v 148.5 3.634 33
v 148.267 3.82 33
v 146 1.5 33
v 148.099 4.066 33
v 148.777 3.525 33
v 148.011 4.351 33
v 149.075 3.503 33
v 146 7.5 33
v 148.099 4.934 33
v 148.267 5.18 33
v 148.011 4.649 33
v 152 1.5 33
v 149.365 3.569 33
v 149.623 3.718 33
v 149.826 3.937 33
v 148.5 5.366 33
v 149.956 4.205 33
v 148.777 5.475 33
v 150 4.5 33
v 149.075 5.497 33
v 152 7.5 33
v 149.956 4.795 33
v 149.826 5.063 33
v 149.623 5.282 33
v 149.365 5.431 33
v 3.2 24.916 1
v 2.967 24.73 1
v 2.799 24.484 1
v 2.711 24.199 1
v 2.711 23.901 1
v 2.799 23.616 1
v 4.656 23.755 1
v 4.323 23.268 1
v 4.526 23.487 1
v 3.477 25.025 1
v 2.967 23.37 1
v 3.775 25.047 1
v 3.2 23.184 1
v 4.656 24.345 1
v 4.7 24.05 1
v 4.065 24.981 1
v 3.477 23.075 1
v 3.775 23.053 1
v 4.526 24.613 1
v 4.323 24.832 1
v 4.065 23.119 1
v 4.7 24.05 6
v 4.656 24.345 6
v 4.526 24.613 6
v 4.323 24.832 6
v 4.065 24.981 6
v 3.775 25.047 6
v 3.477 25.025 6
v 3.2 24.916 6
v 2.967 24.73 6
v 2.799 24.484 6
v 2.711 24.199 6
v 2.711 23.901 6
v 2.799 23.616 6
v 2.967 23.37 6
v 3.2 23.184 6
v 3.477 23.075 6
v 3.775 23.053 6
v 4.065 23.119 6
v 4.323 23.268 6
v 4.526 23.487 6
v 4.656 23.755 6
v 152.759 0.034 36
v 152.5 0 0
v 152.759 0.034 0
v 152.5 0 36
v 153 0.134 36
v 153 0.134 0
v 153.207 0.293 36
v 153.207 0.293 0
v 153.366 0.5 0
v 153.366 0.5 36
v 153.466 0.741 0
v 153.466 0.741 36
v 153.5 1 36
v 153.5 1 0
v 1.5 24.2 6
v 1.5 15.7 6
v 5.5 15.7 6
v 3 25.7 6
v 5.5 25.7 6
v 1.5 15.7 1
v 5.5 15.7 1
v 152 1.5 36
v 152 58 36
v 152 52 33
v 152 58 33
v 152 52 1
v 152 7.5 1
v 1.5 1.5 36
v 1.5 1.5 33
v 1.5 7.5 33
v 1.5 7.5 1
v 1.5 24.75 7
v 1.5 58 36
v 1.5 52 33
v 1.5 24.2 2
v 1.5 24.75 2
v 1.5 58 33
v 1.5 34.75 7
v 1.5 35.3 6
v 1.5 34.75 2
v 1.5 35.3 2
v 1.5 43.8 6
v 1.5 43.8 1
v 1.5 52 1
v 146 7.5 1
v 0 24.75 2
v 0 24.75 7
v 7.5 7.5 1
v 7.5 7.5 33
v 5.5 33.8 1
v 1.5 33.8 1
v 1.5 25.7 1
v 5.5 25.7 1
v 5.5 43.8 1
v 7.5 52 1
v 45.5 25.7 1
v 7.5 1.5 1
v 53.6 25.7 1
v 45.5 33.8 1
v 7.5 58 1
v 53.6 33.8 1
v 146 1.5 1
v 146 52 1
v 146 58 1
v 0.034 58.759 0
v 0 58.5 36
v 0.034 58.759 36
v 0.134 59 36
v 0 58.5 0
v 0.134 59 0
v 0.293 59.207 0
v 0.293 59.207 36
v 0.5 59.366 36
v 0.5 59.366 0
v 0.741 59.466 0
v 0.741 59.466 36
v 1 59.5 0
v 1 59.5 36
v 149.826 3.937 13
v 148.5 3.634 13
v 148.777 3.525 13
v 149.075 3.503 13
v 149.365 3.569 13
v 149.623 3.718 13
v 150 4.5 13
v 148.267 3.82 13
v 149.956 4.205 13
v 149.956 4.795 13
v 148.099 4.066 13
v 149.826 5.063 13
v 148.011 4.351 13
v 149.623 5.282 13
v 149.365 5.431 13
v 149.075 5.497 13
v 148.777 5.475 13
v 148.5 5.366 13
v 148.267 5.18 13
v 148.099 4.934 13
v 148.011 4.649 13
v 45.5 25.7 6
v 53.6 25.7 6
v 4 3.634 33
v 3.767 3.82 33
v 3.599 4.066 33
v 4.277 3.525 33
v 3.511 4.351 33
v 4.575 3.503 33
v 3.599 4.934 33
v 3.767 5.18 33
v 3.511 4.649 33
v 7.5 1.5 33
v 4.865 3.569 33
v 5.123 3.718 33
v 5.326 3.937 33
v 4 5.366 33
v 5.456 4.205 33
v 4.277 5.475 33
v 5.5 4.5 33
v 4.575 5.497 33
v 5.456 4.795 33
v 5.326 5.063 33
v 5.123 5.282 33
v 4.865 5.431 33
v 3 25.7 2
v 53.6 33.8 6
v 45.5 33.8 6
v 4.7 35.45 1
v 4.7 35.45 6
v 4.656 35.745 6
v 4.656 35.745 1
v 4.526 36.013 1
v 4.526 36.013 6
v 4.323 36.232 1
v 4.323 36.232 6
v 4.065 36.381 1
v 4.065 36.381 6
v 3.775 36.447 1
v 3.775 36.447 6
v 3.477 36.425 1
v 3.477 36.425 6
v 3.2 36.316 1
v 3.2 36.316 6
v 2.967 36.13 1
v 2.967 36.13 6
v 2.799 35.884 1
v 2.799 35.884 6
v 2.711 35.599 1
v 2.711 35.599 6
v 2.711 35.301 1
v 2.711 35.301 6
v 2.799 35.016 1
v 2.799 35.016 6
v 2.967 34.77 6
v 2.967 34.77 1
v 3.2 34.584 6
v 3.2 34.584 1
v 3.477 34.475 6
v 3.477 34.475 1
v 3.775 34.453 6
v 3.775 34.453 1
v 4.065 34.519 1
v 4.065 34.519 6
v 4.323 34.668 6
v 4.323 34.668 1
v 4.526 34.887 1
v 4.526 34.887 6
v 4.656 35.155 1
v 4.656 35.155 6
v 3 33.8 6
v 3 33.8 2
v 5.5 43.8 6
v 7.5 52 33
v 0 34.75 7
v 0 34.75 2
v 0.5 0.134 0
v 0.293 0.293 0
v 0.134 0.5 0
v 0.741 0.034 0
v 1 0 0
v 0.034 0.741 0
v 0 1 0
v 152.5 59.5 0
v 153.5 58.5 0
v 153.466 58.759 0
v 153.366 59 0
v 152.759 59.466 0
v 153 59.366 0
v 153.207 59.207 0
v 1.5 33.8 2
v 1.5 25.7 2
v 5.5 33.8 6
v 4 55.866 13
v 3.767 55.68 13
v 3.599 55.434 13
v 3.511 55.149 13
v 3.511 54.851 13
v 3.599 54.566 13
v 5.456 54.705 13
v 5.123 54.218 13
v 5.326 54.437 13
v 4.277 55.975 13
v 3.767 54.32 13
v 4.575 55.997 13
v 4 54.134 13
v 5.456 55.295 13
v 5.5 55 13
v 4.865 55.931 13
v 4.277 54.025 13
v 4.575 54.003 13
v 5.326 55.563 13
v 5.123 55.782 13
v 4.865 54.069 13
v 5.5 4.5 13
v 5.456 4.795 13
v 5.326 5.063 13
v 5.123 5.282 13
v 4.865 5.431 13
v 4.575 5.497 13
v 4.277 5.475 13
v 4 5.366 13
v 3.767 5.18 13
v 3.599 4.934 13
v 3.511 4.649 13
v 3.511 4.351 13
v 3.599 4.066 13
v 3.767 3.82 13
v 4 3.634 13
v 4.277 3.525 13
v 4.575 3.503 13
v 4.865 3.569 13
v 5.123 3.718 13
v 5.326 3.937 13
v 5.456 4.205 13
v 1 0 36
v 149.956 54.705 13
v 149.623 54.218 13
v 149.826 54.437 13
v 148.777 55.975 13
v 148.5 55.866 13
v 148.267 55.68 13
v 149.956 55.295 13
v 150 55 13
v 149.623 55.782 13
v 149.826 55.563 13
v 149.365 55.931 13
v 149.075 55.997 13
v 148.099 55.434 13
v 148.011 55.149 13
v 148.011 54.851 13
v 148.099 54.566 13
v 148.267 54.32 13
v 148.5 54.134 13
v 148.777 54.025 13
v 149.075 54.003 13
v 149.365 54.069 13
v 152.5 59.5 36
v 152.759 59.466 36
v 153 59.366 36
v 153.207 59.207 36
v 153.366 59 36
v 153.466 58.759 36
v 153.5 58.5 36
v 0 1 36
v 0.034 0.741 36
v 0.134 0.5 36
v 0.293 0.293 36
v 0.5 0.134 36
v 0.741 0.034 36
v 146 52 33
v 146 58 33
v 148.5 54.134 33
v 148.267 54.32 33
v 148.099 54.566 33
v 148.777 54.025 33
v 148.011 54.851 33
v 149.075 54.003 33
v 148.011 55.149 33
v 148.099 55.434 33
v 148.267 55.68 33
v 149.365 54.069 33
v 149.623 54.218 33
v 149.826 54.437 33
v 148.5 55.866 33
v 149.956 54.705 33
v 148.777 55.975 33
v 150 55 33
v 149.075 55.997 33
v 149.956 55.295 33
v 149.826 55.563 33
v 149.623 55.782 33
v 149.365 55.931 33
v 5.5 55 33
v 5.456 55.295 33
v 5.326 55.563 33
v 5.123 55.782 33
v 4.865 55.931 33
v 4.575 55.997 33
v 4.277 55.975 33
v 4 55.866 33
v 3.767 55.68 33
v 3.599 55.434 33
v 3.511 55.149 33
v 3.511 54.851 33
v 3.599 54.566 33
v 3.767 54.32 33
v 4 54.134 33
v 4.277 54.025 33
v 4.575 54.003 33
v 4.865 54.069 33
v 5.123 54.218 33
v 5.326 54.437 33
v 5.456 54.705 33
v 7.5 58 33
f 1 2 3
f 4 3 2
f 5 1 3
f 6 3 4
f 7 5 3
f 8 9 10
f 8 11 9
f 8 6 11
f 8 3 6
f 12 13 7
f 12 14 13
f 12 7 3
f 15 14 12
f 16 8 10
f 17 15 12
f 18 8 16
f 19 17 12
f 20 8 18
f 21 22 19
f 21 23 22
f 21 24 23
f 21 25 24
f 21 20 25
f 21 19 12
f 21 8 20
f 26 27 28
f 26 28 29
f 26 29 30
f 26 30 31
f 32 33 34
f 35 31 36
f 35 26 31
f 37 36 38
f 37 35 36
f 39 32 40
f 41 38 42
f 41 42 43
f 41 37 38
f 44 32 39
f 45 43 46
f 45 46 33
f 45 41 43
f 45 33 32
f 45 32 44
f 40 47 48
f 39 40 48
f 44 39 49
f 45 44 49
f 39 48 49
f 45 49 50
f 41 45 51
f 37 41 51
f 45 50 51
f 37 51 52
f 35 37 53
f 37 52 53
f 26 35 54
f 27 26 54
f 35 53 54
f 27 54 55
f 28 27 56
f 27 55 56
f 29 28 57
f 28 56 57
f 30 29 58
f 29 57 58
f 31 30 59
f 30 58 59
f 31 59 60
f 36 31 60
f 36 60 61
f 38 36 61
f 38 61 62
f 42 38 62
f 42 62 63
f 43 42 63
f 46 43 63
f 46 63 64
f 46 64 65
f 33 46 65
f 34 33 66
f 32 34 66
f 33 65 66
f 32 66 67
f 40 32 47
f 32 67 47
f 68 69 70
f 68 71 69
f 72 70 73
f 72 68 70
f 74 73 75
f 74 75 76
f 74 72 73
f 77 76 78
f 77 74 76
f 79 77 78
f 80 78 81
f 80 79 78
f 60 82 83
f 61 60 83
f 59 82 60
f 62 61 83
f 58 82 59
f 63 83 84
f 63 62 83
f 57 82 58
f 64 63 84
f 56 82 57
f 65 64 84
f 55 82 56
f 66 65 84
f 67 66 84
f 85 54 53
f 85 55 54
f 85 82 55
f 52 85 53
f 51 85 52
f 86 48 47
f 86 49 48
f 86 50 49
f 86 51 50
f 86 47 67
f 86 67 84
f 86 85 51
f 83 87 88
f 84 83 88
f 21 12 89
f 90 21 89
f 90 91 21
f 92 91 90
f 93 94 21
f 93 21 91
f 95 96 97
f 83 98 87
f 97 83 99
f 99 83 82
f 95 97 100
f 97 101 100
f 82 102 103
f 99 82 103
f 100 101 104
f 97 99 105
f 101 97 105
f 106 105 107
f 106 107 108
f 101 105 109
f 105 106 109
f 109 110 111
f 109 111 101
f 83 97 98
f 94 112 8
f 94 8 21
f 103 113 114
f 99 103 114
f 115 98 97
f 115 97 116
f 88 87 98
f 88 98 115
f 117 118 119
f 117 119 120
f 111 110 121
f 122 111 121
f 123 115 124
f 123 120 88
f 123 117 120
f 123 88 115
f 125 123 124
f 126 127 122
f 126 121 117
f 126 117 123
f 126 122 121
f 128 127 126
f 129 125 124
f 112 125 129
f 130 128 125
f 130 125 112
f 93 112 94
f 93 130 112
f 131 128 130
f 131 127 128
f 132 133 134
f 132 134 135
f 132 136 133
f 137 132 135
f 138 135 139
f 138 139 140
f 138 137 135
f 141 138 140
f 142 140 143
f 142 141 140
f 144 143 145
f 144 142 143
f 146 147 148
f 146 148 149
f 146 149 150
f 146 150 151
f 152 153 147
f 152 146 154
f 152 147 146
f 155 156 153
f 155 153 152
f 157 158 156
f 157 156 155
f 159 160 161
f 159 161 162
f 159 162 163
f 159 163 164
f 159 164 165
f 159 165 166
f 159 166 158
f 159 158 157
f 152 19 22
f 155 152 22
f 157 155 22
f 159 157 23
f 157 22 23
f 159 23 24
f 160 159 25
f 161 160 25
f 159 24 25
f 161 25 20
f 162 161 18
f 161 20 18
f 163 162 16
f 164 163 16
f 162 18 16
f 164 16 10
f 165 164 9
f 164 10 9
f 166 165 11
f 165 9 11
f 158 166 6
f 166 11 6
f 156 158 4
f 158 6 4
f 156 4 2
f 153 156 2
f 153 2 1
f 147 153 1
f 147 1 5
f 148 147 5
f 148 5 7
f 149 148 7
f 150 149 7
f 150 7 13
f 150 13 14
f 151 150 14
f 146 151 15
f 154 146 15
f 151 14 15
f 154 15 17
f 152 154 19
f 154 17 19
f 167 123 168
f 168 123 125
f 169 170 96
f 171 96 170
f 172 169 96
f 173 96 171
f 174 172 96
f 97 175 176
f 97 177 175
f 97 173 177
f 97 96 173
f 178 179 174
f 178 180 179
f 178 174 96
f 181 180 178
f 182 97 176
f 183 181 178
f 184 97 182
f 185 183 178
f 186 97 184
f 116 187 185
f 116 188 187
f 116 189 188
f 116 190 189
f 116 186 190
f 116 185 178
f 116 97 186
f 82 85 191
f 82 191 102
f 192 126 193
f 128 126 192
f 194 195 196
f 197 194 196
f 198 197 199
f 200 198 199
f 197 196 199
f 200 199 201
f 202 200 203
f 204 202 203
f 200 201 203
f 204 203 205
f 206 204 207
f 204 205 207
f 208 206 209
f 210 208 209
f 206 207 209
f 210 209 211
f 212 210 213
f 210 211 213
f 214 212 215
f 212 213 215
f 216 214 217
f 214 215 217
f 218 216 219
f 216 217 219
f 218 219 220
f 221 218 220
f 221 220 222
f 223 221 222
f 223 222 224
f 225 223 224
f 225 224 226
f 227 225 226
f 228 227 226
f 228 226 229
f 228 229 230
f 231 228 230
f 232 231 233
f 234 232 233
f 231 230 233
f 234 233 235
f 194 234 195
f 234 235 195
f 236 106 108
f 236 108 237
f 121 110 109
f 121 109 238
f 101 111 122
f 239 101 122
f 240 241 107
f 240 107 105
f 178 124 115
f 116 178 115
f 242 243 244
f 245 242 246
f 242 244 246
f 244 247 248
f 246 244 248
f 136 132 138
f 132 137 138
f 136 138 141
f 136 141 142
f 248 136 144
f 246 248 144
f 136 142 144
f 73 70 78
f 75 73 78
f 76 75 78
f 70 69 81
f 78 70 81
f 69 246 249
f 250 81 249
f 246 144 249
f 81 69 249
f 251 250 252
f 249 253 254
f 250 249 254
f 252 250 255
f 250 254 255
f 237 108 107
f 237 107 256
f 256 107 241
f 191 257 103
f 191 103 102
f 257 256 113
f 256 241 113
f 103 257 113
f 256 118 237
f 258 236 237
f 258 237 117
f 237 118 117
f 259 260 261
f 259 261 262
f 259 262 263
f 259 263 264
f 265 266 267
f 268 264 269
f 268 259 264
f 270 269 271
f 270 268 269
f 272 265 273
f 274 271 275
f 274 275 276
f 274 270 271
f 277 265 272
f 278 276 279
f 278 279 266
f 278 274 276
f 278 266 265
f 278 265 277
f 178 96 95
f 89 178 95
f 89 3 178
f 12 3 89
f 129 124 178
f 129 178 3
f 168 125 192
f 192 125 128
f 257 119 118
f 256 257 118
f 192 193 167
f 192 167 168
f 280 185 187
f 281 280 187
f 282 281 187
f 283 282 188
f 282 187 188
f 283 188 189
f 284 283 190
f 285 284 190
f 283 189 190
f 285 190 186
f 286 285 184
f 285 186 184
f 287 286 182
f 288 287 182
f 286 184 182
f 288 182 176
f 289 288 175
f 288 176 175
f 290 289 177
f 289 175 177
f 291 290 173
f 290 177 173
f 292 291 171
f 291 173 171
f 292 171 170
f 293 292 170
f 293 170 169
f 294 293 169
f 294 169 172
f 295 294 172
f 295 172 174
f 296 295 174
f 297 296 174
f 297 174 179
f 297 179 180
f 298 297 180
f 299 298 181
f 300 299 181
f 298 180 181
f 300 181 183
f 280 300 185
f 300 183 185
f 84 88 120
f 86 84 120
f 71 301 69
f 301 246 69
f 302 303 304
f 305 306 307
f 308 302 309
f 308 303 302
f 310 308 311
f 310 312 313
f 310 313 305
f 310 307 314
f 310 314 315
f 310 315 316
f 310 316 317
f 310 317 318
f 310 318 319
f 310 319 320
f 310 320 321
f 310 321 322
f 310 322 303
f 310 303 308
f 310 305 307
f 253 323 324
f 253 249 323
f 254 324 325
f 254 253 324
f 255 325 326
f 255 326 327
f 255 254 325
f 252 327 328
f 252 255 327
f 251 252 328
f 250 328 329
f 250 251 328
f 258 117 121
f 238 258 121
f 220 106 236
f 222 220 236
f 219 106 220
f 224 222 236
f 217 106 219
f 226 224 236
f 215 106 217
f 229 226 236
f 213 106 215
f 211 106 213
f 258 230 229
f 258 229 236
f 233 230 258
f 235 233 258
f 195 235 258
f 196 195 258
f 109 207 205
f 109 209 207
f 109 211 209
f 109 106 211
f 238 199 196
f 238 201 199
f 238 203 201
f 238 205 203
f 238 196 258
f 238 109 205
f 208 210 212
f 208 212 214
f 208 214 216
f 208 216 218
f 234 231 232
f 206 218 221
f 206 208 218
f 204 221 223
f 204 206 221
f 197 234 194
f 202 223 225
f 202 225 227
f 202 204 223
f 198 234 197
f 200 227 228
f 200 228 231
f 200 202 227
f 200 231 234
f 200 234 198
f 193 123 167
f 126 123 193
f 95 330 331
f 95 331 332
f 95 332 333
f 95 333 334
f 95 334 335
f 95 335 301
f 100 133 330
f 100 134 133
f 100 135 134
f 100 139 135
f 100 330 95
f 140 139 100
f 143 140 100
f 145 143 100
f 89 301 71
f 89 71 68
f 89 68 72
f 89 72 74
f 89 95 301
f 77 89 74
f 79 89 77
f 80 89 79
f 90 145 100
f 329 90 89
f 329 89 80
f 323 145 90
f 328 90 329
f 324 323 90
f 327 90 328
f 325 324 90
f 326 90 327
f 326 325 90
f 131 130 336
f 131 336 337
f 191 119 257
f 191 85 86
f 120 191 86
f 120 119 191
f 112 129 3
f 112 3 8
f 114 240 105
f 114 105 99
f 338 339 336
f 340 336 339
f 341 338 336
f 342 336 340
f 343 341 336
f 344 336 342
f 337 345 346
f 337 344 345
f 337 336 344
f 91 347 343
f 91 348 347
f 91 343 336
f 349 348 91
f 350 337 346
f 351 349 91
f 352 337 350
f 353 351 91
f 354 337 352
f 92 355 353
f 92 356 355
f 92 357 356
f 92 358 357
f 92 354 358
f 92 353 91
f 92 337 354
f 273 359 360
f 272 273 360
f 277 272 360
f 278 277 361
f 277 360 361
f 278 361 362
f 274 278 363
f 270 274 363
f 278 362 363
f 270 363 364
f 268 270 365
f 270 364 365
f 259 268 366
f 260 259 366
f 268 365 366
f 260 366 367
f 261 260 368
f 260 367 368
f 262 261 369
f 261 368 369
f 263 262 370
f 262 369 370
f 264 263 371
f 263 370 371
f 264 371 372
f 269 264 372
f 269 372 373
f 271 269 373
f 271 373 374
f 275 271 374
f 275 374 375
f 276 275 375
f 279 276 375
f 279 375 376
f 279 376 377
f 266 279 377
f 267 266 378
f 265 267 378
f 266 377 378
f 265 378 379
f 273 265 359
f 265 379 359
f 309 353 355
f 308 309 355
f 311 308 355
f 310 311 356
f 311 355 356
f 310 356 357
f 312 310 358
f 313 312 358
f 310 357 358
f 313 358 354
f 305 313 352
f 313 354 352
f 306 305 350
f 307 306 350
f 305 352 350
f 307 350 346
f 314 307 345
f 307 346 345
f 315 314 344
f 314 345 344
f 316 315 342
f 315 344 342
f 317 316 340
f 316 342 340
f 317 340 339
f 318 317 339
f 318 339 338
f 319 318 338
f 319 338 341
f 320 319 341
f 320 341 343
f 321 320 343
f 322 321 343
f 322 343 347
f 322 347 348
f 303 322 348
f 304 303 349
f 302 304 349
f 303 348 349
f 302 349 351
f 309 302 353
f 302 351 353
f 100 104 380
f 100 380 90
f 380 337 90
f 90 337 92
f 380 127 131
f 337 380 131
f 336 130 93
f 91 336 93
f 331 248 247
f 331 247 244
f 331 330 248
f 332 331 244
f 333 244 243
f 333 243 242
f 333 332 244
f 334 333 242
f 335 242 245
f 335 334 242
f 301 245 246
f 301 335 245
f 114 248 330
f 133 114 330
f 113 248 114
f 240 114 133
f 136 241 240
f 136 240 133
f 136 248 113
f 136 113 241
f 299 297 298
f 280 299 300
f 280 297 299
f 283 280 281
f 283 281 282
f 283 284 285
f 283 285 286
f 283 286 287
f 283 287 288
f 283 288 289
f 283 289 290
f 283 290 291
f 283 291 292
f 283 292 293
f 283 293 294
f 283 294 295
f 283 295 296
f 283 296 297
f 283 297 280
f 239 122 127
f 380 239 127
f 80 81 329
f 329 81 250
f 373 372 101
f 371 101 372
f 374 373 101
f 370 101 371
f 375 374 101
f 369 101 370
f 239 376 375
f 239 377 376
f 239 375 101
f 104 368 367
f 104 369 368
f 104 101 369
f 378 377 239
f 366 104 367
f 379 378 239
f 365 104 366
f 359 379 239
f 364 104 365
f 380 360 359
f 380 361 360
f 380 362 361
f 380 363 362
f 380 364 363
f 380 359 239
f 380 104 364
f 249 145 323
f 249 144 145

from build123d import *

# Parameters (mm, degrees)
SKETCH_W        = 153.5
SKETCH_H        = 59.5
PAD_DEPTH       = 1
SKETCH001_W     = 153.5
SKETCH001_H     = 59.5
SKETCH001_W_2   = 150.5
SKETCH001_H_2   = 56.5
PAD001_DEPTH    = 35
SKETCH002_W     = 6
SKETCH002_H     = 6
PAD002_DEPTH    = 32
SKETCH003_R     = 1
POCKET_DEPTH    = 20
SKETCH004_W     = 4
SKETCH004_H     = 10
SKETCH004_W_2   = 8.1
SKETCH004_H_2   = 8.1
PAD003_DEPTH    = 5
SKETCH005_R     = 1
POCKET001_DEPTH = 5
SKETCH006_W     = 10
SKETCH006_H     = 5
POCKET002_DEPTH = 1.5
FILLET_R        = 1
POCKET003_DEPTH = 4


with BuildPart() as part:
    # Sketch → Pad (new body)
    with BuildSketch(Plane.XY):
        with Locations((76.75, 29.75)):
            Rectangle(SKETCH_W, SKETCH_H)
    extrude(amount=PAD_DEPTH)

    # Sketch001 (on Face6 of Pad) → Pad001 (join)
    with BuildSketch(Plane.XY.offset(1)):
        with Locations((76.75, 29.75)):
            Rectangle(SKETCH001_W, SKETCH001_H)
        with Locations((76.75, 29.75)):
            Rectangle(SKETCH001_W_2, SKETCH001_H_2, mode=Mode.SUBTRACT)
    extrude(amount=PAD001_DEPTH)

    # Sketch002 (on Face15 of Pad001) → Pad002 (join)
    with BuildSketch(Plane.XY.offset(1)):
        with Locations((4.5, 55)):
            Rectangle(SKETCH002_W, SKETCH002_H)
        with Locations((149, 55)):
            Rectangle(SKETCH002_W, SKETCH002_H)
        with Locations((149, 4.5)):
            Rectangle(SKETCH002_W, SKETCH002_H)
        with Locations((4.5, 4.5)):
            Rectangle(SKETCH002_W, SKETCH002_H)
    extrude(amount=PAD002_DEPTH)

    # Sketch003 (on Face15 of Pad002) → Pocket (cut)
    with BuildSketch(Plane.XY.offset(33)):
        with Locations((4.5, 55)):
            Circle(SKETCH003_R)
        with Locations((4.5, 4.5)):
            Circle(SKETCH003_R)
        with Locations((149, 4.5)):
            Circle(SKETCH003_R)
        with Locations((149, 55)):
            Circle(SKETCH003_R)
    extrude(amount=-POCKET_DEPTH, mode=Mode.SUBTRACT)

    # Sketch004 (on Face17 of Pocket) → Pad003 (join)
    with BuildSketch(Plane.XY.offset(1)):
        with Locations((3.5, 38.8)):
            Rectangle(SKETCH004_W, SKETCH004_H)
        with Locations((3.5, 20.7)):
            Rectangle(SKETCH004_W, SKETCH004_H)
        with Locations((49.55, 29.75)):
            Rectangle(SKETCH004_W_2, SKETCH004_H_2)
    extrude(amount=PAD003_DEPTH)

    # Sketch005 (on Face28 of Pad003) → Pocket001 (cut)
    with BuildSketch(Plane.XY.offset(6)):
        with Locations((3.7, 35.45)):
            Circle(SKETCH005_R)
        with Locations((3.7, 24.05)):
            Circle(SKETCH005_R)
    extrude(amount=-POCKET001_DEPTH, mode=Mode.SUBTRACT)

    # Sketch006 (on Face7 of Pocket001) → Pocket002 (cut)
    with BuildSketch(Plane(origin=(0, 0, 0), x_dir=(0, -1, 0), z_dir=(-1, 0, 0))):
        with Locations((-29.75, 4.5)):
            Rectangle(SKETCH006_W, SKETCH006_H)
    extrude(amount=-POCKET002_DEPTH, mode=Mode.SUBTRACT)

    # Fillet
    fillet_edges = [part.edges().sort_by_distance(p)[0] for p in [
        (153.5, 0, 18.5),
        (153.5, 59.5, 18.5),
        (0, 59.5, 18.5),
        (0, 0, 18.5),
    ]]
    fillet(fillet_edges, radius=FILLET_R)

    # Sketch007 (on Face40 of Fillet) → Pocket003 (cut)
    with BuildSketch(Plane.XY.offset(6)):
        Polygon((3, 33.8), (1.5, 33.8), (1.5, 35.3), align=None)
        Polygon((3, 25.7), (1.5, 24.2), (1.5, 25.7), align=None)
    extrude(amount=-POCKET003_DEPTH, mode=Mode.SUBTRACT)


solid = part.part
